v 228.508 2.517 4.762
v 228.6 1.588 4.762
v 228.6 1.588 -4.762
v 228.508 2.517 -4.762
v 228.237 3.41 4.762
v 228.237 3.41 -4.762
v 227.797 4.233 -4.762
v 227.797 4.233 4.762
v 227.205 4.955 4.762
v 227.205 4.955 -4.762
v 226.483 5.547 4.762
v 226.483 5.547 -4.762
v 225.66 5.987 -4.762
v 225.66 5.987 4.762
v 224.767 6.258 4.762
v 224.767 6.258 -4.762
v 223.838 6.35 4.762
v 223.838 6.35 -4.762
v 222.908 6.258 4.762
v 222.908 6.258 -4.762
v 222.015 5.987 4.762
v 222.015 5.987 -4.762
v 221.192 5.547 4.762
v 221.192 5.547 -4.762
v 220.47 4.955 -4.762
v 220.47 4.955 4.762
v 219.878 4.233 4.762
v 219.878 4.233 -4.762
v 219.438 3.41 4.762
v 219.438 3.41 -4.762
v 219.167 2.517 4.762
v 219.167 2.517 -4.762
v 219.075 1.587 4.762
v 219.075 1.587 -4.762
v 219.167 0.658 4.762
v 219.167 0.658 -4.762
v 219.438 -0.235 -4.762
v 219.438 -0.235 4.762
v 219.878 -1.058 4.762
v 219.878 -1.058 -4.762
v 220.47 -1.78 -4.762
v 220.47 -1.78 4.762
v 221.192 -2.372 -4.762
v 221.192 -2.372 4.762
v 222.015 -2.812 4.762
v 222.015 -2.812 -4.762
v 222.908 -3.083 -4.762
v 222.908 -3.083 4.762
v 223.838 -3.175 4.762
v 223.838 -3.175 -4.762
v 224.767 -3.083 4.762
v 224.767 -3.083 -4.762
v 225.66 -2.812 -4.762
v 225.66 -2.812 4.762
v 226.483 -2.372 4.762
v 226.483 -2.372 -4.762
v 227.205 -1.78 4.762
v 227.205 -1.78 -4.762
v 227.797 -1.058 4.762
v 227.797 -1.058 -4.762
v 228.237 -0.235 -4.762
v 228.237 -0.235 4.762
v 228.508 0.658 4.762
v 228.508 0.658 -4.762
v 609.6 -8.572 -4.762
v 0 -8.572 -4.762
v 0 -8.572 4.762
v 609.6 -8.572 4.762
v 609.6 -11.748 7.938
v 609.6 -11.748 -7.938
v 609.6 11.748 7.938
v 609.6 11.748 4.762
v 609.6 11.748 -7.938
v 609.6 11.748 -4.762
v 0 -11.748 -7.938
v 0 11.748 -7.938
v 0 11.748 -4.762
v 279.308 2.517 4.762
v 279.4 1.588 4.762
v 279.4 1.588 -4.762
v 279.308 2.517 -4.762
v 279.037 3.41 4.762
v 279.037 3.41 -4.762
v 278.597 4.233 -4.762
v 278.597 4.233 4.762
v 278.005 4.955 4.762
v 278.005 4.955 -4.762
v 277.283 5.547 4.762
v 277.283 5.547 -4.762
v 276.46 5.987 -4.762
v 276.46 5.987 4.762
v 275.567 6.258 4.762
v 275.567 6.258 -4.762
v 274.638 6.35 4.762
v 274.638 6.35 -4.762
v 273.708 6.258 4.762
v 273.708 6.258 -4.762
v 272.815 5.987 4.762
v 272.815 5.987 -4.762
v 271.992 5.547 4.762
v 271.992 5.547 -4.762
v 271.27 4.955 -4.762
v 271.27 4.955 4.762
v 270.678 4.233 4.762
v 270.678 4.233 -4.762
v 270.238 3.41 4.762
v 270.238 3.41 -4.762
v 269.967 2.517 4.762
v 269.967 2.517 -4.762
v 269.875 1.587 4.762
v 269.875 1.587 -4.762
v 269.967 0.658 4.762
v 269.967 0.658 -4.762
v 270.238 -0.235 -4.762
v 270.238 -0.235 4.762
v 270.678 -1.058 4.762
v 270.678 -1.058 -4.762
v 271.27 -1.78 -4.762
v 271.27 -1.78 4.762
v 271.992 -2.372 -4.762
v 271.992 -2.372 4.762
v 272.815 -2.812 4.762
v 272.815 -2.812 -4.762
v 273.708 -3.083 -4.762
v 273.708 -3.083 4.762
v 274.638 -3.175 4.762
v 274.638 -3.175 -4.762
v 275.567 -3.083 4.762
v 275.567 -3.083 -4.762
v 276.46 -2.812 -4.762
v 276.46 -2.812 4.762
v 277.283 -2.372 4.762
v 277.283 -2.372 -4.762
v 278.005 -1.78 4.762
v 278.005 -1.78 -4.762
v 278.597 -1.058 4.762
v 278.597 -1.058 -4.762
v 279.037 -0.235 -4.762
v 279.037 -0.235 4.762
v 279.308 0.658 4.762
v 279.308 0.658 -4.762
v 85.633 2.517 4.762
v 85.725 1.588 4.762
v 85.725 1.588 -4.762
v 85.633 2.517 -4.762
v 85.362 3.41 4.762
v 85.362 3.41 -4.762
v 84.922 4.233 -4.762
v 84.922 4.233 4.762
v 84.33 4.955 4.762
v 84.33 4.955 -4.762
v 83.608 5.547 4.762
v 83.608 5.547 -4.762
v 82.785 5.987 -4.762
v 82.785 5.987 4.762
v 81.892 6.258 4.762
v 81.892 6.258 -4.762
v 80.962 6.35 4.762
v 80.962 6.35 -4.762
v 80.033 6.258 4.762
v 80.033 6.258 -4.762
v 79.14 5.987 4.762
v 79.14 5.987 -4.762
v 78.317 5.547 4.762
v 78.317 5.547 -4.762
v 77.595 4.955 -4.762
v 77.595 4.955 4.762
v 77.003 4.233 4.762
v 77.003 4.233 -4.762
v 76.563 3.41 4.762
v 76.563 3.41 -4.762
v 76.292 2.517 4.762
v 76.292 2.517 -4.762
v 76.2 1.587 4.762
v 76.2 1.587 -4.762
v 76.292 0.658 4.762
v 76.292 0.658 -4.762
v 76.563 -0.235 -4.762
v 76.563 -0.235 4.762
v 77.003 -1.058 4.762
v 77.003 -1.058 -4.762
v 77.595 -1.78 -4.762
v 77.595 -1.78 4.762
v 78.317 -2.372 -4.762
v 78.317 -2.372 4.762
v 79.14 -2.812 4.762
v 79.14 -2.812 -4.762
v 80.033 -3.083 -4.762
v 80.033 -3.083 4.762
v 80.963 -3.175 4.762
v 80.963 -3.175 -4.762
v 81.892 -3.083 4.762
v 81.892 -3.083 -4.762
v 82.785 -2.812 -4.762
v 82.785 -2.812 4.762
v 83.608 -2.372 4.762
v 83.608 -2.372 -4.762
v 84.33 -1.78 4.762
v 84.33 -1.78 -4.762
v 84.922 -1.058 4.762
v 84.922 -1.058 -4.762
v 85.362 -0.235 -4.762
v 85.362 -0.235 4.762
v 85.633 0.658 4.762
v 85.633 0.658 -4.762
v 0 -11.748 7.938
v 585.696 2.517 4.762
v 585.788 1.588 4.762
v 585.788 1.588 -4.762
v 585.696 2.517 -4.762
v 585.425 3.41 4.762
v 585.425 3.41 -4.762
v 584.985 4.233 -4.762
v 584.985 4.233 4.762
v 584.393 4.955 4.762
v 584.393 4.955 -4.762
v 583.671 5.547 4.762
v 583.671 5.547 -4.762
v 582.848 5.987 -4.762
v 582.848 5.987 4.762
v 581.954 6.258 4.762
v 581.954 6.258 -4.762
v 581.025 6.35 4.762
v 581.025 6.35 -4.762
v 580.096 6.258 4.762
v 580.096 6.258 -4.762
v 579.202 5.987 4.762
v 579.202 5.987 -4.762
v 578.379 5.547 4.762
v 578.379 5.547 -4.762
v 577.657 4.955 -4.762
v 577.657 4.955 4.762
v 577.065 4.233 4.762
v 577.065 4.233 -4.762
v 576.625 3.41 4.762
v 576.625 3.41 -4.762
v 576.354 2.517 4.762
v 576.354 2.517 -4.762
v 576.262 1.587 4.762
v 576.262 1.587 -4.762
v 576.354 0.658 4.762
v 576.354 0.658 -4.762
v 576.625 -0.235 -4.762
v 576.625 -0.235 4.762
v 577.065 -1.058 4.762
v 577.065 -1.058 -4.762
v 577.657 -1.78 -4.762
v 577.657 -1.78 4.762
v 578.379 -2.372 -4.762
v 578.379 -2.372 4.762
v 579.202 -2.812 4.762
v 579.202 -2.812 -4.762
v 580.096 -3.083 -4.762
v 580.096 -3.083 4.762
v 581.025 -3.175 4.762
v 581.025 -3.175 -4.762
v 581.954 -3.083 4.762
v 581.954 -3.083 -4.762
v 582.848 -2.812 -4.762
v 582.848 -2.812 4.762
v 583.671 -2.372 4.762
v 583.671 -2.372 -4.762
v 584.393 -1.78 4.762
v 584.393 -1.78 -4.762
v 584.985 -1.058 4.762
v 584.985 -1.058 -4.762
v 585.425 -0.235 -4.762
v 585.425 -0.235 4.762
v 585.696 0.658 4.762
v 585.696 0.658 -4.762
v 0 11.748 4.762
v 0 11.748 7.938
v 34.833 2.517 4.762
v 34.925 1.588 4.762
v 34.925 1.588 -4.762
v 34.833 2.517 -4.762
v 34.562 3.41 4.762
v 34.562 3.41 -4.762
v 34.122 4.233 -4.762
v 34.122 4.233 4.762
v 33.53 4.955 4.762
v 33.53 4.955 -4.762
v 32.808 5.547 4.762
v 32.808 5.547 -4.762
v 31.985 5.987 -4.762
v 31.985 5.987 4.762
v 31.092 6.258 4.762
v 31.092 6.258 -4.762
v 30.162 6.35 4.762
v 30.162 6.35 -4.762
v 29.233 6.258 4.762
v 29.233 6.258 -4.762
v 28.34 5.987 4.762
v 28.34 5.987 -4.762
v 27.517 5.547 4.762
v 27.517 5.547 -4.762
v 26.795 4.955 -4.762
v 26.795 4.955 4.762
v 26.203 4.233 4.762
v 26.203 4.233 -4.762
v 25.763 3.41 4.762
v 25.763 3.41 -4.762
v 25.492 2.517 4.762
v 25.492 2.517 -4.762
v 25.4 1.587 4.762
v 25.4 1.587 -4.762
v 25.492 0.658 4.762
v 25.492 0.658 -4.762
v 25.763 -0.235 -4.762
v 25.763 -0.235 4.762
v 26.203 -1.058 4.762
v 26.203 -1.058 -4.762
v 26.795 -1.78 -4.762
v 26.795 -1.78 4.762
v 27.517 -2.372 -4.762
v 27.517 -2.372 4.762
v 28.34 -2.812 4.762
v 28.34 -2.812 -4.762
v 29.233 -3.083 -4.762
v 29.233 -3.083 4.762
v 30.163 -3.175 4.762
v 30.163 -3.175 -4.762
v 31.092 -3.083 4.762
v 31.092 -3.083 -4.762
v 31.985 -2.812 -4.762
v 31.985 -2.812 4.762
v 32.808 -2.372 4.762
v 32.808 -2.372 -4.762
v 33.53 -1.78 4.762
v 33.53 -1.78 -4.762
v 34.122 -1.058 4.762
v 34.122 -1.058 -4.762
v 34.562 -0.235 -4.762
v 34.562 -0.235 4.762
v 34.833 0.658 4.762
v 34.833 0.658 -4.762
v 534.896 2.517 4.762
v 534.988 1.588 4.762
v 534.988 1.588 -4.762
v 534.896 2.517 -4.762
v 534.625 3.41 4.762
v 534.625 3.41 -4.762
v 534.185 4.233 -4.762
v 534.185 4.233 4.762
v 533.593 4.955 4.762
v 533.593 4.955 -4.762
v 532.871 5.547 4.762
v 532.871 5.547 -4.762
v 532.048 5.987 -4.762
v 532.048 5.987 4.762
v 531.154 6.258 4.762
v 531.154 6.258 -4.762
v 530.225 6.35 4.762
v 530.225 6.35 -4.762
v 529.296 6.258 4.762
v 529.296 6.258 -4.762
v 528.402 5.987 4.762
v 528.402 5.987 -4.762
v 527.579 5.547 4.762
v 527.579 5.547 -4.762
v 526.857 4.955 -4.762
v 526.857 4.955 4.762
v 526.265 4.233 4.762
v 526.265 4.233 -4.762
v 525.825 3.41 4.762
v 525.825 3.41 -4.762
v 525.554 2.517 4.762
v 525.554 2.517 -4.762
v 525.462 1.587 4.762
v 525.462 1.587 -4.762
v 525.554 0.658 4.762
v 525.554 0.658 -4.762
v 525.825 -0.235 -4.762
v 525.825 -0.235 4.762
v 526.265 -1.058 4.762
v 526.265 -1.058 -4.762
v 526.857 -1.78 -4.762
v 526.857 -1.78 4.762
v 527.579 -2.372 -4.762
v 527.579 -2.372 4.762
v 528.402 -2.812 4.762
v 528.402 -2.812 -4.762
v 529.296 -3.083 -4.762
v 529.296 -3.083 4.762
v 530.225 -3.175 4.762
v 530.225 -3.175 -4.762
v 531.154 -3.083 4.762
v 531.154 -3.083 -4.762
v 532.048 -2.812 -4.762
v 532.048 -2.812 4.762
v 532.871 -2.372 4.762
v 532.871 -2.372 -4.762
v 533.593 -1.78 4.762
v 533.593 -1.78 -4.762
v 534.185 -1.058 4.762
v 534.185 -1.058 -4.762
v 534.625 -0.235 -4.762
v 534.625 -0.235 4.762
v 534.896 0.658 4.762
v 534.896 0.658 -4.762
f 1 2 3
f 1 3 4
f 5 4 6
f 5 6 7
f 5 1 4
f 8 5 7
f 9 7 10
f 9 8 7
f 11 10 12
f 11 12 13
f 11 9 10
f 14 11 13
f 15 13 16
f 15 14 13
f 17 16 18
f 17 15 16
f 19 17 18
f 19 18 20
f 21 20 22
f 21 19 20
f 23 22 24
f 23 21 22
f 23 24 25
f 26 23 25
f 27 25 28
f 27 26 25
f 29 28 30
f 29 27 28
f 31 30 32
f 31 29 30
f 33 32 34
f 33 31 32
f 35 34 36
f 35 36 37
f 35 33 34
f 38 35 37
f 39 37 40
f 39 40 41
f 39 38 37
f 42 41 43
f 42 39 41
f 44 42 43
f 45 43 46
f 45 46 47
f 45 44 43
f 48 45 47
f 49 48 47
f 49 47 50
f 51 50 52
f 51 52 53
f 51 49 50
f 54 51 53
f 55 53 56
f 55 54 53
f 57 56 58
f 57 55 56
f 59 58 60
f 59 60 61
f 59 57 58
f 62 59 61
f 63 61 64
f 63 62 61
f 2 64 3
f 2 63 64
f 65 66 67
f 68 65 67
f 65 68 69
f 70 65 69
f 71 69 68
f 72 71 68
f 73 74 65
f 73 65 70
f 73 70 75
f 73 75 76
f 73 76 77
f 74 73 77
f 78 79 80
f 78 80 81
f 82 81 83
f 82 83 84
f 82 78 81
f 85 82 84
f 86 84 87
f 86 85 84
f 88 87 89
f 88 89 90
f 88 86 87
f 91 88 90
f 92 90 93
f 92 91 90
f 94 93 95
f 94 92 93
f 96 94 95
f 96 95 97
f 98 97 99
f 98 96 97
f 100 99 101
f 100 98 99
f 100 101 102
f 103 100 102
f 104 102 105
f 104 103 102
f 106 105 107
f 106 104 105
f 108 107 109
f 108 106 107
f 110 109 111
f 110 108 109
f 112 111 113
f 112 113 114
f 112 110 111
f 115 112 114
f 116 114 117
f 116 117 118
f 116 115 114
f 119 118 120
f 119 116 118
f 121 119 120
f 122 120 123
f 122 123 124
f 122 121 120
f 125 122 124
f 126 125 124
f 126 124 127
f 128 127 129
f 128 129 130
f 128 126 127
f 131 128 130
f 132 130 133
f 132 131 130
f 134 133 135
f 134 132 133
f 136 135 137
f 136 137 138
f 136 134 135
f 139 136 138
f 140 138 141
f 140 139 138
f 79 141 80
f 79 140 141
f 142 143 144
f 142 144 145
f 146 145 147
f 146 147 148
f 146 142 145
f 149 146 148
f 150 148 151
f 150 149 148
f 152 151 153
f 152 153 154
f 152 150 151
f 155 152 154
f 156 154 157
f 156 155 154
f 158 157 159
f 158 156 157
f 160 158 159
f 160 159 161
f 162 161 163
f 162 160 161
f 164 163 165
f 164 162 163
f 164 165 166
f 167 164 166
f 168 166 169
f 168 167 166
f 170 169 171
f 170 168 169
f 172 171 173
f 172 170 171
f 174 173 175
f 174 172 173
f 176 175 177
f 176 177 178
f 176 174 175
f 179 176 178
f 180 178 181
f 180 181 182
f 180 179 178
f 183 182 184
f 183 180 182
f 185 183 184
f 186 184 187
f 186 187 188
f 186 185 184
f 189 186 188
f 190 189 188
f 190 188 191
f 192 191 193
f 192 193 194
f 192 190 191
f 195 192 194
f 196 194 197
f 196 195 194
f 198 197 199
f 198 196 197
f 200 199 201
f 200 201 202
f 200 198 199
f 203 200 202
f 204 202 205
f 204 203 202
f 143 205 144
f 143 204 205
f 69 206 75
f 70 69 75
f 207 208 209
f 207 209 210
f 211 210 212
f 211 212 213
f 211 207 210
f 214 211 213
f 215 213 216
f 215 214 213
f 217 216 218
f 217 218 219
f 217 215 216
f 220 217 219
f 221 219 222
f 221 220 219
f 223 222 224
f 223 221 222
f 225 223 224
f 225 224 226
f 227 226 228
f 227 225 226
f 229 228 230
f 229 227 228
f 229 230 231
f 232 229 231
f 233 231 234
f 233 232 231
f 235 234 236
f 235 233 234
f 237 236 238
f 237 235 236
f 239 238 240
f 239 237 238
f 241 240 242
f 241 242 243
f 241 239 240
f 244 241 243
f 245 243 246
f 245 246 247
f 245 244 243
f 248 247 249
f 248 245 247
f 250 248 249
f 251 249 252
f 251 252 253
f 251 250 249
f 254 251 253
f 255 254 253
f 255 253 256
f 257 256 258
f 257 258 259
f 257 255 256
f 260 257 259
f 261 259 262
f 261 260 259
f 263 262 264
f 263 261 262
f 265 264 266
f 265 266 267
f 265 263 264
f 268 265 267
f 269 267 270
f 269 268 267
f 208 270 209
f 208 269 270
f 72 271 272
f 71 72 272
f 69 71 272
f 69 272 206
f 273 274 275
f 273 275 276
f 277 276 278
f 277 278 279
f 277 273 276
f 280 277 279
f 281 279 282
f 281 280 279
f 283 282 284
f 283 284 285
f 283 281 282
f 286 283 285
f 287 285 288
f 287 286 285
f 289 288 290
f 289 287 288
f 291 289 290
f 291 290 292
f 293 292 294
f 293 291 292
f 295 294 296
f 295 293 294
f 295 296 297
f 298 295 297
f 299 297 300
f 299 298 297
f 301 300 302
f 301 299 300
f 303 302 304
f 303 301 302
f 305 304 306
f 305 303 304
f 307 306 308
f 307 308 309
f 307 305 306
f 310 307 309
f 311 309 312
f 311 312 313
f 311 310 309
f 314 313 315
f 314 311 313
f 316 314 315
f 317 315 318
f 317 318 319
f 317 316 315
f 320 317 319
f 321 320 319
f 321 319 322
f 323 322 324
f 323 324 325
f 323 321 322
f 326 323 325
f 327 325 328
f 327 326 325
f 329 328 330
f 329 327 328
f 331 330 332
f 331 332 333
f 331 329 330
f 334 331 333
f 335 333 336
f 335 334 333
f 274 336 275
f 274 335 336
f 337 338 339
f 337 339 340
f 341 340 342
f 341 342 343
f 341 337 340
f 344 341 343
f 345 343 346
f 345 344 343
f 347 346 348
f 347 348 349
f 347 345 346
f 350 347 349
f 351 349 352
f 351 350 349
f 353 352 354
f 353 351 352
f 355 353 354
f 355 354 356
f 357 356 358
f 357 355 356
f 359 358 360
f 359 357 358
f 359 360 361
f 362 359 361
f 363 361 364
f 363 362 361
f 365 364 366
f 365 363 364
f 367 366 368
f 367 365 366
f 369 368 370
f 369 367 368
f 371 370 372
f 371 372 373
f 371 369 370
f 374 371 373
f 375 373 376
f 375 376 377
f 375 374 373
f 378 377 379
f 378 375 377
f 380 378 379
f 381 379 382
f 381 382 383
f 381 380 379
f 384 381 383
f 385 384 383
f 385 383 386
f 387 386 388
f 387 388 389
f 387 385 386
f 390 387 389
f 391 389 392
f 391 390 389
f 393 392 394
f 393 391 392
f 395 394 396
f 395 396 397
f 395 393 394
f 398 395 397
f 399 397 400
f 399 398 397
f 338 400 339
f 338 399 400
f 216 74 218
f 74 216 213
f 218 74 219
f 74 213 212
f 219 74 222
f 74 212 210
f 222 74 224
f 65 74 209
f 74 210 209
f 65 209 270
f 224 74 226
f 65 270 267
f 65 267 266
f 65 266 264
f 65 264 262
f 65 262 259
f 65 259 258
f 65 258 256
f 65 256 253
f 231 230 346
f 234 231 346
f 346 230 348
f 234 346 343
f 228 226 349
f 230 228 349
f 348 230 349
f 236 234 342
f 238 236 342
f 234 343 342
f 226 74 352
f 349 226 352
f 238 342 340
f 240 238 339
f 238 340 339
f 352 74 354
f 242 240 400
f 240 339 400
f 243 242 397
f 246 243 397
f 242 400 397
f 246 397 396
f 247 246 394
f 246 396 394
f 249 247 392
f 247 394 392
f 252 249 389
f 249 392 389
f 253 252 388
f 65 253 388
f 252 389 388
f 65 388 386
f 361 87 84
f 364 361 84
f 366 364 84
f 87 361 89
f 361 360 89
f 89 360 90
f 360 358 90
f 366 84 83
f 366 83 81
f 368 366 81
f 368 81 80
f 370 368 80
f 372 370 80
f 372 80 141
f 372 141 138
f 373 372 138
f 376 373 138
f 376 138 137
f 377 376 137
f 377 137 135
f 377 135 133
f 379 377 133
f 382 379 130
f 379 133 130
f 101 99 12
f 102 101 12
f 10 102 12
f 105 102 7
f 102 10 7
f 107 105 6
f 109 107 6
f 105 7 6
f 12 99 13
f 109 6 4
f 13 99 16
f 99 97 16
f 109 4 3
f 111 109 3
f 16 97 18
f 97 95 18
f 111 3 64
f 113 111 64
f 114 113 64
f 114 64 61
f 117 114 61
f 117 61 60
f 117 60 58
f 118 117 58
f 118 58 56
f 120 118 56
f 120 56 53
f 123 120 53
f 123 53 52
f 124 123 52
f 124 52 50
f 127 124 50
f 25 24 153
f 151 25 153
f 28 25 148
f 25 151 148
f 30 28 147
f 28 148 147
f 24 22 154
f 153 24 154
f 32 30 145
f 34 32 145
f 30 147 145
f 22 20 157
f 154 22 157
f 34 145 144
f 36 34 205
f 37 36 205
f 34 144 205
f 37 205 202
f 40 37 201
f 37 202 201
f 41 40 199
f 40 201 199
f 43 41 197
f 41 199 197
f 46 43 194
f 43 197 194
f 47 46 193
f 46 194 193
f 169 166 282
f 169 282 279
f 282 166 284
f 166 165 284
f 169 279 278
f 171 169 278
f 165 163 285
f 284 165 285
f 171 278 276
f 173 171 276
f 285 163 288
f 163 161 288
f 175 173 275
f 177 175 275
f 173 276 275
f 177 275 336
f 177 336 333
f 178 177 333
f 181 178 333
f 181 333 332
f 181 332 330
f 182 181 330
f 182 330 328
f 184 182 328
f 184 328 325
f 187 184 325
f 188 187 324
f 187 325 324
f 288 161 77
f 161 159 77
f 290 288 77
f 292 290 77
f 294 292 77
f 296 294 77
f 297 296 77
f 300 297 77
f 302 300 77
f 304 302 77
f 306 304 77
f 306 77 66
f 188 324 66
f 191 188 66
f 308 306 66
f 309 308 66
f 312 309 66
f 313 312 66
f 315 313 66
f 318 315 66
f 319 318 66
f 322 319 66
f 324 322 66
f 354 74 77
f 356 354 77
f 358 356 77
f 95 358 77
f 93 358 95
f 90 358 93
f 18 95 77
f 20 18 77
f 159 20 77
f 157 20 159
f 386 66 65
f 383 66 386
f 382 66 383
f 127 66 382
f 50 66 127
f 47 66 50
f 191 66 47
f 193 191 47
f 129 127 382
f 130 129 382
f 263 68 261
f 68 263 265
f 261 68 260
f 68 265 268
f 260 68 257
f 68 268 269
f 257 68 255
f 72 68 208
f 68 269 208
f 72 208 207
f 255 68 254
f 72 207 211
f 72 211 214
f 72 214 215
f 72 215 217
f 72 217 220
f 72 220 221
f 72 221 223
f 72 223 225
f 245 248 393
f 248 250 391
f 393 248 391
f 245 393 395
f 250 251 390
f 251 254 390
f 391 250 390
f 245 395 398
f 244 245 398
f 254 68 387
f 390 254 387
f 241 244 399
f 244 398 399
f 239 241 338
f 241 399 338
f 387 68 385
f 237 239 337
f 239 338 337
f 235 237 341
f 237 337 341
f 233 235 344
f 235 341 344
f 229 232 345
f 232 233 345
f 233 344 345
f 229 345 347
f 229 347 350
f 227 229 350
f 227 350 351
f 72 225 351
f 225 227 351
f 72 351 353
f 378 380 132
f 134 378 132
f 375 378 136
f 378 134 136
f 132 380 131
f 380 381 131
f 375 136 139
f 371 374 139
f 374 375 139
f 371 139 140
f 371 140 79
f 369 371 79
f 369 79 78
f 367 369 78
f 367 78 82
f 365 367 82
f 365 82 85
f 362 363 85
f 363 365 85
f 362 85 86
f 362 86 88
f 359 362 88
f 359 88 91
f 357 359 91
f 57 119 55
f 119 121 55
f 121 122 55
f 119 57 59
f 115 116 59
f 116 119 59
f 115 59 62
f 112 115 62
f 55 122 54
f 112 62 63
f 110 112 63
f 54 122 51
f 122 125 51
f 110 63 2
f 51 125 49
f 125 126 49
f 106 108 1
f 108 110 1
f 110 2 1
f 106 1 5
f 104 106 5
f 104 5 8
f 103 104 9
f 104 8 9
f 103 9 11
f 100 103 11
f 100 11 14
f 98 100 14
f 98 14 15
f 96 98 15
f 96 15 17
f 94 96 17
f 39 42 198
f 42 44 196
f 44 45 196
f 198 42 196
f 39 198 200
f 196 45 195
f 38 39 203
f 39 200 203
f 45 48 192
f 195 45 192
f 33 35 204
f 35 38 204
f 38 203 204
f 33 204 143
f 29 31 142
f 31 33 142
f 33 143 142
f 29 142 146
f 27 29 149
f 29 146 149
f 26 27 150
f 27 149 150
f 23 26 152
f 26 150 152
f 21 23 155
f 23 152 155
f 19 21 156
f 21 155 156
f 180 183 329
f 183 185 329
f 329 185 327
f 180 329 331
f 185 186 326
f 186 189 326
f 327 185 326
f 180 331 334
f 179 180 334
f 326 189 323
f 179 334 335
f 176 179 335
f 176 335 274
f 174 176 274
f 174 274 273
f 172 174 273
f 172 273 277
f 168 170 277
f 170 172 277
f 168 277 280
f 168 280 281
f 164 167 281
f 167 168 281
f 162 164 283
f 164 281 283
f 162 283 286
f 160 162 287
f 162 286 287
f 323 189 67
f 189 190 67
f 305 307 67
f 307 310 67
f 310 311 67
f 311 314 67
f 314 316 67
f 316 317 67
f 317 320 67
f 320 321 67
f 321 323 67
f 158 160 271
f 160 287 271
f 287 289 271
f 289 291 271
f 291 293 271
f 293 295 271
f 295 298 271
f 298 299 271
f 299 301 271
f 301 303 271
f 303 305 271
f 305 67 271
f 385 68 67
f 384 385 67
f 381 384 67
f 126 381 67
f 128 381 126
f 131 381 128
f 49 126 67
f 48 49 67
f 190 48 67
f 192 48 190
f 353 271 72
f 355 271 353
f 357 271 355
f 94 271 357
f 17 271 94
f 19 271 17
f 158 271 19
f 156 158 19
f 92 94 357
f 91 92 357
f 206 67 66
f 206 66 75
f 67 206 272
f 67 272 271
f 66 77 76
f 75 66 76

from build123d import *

# Parameters (mm, degrees)
BOSS_EXTRUDE1_DEPTH = 609.6
SKETCH2_R           = 4.7625
BOSS_EXTRUDE5_DEPTH = 9.525


with BuildPart() as part:
    # Sketch1 → Boss-Extrude1 (new body)
    with BuildSketch(Plane(origin=(0, 0, 0), x_dir=(0, 0, -1), z_dir=(1, 0, 0))):
        Polygon((-4.7625, 7.0485), (-4.7625, 11.7475), (-7.9375, 11.7475), (-7.9375, -11.7475), (7.9375, -11.7475), (7.9375, 11.7475), (4.7625, 11.7475), (4.7625, 8.5725), (4.7625, -8.5725), (-4.7625, -8.5725), align=None)
    extrude(amount=BOSS_EXTRUDE1_DEPTH)

    # Sketch2 → Boss-Extrude5 (add)
    with BuildSketch(Plane.XY.offset(4.7625)):
        with Locations((581.025, 1.5875)):
            Circle(SKETCH2_R)
        with Locations((530.225, 1.5875)):
            Circle(SKETCH2_R)
        with Locations((274.6375, 1.5875)):
            Circle(SKETCH2_R)
        with Locations((223.8375, 1.5875)):
            Circle(SKETCH2_R)
        with Locations((30.1625, 1.5875)):
            Circle(SKETCH2_R)
        with Locations((80.9625, 1.5875)):
            Circle(SKETCH2_R)
    extrude(amount=-BOSS_EXTRUDE5_DEPTH)


solid = part.part
